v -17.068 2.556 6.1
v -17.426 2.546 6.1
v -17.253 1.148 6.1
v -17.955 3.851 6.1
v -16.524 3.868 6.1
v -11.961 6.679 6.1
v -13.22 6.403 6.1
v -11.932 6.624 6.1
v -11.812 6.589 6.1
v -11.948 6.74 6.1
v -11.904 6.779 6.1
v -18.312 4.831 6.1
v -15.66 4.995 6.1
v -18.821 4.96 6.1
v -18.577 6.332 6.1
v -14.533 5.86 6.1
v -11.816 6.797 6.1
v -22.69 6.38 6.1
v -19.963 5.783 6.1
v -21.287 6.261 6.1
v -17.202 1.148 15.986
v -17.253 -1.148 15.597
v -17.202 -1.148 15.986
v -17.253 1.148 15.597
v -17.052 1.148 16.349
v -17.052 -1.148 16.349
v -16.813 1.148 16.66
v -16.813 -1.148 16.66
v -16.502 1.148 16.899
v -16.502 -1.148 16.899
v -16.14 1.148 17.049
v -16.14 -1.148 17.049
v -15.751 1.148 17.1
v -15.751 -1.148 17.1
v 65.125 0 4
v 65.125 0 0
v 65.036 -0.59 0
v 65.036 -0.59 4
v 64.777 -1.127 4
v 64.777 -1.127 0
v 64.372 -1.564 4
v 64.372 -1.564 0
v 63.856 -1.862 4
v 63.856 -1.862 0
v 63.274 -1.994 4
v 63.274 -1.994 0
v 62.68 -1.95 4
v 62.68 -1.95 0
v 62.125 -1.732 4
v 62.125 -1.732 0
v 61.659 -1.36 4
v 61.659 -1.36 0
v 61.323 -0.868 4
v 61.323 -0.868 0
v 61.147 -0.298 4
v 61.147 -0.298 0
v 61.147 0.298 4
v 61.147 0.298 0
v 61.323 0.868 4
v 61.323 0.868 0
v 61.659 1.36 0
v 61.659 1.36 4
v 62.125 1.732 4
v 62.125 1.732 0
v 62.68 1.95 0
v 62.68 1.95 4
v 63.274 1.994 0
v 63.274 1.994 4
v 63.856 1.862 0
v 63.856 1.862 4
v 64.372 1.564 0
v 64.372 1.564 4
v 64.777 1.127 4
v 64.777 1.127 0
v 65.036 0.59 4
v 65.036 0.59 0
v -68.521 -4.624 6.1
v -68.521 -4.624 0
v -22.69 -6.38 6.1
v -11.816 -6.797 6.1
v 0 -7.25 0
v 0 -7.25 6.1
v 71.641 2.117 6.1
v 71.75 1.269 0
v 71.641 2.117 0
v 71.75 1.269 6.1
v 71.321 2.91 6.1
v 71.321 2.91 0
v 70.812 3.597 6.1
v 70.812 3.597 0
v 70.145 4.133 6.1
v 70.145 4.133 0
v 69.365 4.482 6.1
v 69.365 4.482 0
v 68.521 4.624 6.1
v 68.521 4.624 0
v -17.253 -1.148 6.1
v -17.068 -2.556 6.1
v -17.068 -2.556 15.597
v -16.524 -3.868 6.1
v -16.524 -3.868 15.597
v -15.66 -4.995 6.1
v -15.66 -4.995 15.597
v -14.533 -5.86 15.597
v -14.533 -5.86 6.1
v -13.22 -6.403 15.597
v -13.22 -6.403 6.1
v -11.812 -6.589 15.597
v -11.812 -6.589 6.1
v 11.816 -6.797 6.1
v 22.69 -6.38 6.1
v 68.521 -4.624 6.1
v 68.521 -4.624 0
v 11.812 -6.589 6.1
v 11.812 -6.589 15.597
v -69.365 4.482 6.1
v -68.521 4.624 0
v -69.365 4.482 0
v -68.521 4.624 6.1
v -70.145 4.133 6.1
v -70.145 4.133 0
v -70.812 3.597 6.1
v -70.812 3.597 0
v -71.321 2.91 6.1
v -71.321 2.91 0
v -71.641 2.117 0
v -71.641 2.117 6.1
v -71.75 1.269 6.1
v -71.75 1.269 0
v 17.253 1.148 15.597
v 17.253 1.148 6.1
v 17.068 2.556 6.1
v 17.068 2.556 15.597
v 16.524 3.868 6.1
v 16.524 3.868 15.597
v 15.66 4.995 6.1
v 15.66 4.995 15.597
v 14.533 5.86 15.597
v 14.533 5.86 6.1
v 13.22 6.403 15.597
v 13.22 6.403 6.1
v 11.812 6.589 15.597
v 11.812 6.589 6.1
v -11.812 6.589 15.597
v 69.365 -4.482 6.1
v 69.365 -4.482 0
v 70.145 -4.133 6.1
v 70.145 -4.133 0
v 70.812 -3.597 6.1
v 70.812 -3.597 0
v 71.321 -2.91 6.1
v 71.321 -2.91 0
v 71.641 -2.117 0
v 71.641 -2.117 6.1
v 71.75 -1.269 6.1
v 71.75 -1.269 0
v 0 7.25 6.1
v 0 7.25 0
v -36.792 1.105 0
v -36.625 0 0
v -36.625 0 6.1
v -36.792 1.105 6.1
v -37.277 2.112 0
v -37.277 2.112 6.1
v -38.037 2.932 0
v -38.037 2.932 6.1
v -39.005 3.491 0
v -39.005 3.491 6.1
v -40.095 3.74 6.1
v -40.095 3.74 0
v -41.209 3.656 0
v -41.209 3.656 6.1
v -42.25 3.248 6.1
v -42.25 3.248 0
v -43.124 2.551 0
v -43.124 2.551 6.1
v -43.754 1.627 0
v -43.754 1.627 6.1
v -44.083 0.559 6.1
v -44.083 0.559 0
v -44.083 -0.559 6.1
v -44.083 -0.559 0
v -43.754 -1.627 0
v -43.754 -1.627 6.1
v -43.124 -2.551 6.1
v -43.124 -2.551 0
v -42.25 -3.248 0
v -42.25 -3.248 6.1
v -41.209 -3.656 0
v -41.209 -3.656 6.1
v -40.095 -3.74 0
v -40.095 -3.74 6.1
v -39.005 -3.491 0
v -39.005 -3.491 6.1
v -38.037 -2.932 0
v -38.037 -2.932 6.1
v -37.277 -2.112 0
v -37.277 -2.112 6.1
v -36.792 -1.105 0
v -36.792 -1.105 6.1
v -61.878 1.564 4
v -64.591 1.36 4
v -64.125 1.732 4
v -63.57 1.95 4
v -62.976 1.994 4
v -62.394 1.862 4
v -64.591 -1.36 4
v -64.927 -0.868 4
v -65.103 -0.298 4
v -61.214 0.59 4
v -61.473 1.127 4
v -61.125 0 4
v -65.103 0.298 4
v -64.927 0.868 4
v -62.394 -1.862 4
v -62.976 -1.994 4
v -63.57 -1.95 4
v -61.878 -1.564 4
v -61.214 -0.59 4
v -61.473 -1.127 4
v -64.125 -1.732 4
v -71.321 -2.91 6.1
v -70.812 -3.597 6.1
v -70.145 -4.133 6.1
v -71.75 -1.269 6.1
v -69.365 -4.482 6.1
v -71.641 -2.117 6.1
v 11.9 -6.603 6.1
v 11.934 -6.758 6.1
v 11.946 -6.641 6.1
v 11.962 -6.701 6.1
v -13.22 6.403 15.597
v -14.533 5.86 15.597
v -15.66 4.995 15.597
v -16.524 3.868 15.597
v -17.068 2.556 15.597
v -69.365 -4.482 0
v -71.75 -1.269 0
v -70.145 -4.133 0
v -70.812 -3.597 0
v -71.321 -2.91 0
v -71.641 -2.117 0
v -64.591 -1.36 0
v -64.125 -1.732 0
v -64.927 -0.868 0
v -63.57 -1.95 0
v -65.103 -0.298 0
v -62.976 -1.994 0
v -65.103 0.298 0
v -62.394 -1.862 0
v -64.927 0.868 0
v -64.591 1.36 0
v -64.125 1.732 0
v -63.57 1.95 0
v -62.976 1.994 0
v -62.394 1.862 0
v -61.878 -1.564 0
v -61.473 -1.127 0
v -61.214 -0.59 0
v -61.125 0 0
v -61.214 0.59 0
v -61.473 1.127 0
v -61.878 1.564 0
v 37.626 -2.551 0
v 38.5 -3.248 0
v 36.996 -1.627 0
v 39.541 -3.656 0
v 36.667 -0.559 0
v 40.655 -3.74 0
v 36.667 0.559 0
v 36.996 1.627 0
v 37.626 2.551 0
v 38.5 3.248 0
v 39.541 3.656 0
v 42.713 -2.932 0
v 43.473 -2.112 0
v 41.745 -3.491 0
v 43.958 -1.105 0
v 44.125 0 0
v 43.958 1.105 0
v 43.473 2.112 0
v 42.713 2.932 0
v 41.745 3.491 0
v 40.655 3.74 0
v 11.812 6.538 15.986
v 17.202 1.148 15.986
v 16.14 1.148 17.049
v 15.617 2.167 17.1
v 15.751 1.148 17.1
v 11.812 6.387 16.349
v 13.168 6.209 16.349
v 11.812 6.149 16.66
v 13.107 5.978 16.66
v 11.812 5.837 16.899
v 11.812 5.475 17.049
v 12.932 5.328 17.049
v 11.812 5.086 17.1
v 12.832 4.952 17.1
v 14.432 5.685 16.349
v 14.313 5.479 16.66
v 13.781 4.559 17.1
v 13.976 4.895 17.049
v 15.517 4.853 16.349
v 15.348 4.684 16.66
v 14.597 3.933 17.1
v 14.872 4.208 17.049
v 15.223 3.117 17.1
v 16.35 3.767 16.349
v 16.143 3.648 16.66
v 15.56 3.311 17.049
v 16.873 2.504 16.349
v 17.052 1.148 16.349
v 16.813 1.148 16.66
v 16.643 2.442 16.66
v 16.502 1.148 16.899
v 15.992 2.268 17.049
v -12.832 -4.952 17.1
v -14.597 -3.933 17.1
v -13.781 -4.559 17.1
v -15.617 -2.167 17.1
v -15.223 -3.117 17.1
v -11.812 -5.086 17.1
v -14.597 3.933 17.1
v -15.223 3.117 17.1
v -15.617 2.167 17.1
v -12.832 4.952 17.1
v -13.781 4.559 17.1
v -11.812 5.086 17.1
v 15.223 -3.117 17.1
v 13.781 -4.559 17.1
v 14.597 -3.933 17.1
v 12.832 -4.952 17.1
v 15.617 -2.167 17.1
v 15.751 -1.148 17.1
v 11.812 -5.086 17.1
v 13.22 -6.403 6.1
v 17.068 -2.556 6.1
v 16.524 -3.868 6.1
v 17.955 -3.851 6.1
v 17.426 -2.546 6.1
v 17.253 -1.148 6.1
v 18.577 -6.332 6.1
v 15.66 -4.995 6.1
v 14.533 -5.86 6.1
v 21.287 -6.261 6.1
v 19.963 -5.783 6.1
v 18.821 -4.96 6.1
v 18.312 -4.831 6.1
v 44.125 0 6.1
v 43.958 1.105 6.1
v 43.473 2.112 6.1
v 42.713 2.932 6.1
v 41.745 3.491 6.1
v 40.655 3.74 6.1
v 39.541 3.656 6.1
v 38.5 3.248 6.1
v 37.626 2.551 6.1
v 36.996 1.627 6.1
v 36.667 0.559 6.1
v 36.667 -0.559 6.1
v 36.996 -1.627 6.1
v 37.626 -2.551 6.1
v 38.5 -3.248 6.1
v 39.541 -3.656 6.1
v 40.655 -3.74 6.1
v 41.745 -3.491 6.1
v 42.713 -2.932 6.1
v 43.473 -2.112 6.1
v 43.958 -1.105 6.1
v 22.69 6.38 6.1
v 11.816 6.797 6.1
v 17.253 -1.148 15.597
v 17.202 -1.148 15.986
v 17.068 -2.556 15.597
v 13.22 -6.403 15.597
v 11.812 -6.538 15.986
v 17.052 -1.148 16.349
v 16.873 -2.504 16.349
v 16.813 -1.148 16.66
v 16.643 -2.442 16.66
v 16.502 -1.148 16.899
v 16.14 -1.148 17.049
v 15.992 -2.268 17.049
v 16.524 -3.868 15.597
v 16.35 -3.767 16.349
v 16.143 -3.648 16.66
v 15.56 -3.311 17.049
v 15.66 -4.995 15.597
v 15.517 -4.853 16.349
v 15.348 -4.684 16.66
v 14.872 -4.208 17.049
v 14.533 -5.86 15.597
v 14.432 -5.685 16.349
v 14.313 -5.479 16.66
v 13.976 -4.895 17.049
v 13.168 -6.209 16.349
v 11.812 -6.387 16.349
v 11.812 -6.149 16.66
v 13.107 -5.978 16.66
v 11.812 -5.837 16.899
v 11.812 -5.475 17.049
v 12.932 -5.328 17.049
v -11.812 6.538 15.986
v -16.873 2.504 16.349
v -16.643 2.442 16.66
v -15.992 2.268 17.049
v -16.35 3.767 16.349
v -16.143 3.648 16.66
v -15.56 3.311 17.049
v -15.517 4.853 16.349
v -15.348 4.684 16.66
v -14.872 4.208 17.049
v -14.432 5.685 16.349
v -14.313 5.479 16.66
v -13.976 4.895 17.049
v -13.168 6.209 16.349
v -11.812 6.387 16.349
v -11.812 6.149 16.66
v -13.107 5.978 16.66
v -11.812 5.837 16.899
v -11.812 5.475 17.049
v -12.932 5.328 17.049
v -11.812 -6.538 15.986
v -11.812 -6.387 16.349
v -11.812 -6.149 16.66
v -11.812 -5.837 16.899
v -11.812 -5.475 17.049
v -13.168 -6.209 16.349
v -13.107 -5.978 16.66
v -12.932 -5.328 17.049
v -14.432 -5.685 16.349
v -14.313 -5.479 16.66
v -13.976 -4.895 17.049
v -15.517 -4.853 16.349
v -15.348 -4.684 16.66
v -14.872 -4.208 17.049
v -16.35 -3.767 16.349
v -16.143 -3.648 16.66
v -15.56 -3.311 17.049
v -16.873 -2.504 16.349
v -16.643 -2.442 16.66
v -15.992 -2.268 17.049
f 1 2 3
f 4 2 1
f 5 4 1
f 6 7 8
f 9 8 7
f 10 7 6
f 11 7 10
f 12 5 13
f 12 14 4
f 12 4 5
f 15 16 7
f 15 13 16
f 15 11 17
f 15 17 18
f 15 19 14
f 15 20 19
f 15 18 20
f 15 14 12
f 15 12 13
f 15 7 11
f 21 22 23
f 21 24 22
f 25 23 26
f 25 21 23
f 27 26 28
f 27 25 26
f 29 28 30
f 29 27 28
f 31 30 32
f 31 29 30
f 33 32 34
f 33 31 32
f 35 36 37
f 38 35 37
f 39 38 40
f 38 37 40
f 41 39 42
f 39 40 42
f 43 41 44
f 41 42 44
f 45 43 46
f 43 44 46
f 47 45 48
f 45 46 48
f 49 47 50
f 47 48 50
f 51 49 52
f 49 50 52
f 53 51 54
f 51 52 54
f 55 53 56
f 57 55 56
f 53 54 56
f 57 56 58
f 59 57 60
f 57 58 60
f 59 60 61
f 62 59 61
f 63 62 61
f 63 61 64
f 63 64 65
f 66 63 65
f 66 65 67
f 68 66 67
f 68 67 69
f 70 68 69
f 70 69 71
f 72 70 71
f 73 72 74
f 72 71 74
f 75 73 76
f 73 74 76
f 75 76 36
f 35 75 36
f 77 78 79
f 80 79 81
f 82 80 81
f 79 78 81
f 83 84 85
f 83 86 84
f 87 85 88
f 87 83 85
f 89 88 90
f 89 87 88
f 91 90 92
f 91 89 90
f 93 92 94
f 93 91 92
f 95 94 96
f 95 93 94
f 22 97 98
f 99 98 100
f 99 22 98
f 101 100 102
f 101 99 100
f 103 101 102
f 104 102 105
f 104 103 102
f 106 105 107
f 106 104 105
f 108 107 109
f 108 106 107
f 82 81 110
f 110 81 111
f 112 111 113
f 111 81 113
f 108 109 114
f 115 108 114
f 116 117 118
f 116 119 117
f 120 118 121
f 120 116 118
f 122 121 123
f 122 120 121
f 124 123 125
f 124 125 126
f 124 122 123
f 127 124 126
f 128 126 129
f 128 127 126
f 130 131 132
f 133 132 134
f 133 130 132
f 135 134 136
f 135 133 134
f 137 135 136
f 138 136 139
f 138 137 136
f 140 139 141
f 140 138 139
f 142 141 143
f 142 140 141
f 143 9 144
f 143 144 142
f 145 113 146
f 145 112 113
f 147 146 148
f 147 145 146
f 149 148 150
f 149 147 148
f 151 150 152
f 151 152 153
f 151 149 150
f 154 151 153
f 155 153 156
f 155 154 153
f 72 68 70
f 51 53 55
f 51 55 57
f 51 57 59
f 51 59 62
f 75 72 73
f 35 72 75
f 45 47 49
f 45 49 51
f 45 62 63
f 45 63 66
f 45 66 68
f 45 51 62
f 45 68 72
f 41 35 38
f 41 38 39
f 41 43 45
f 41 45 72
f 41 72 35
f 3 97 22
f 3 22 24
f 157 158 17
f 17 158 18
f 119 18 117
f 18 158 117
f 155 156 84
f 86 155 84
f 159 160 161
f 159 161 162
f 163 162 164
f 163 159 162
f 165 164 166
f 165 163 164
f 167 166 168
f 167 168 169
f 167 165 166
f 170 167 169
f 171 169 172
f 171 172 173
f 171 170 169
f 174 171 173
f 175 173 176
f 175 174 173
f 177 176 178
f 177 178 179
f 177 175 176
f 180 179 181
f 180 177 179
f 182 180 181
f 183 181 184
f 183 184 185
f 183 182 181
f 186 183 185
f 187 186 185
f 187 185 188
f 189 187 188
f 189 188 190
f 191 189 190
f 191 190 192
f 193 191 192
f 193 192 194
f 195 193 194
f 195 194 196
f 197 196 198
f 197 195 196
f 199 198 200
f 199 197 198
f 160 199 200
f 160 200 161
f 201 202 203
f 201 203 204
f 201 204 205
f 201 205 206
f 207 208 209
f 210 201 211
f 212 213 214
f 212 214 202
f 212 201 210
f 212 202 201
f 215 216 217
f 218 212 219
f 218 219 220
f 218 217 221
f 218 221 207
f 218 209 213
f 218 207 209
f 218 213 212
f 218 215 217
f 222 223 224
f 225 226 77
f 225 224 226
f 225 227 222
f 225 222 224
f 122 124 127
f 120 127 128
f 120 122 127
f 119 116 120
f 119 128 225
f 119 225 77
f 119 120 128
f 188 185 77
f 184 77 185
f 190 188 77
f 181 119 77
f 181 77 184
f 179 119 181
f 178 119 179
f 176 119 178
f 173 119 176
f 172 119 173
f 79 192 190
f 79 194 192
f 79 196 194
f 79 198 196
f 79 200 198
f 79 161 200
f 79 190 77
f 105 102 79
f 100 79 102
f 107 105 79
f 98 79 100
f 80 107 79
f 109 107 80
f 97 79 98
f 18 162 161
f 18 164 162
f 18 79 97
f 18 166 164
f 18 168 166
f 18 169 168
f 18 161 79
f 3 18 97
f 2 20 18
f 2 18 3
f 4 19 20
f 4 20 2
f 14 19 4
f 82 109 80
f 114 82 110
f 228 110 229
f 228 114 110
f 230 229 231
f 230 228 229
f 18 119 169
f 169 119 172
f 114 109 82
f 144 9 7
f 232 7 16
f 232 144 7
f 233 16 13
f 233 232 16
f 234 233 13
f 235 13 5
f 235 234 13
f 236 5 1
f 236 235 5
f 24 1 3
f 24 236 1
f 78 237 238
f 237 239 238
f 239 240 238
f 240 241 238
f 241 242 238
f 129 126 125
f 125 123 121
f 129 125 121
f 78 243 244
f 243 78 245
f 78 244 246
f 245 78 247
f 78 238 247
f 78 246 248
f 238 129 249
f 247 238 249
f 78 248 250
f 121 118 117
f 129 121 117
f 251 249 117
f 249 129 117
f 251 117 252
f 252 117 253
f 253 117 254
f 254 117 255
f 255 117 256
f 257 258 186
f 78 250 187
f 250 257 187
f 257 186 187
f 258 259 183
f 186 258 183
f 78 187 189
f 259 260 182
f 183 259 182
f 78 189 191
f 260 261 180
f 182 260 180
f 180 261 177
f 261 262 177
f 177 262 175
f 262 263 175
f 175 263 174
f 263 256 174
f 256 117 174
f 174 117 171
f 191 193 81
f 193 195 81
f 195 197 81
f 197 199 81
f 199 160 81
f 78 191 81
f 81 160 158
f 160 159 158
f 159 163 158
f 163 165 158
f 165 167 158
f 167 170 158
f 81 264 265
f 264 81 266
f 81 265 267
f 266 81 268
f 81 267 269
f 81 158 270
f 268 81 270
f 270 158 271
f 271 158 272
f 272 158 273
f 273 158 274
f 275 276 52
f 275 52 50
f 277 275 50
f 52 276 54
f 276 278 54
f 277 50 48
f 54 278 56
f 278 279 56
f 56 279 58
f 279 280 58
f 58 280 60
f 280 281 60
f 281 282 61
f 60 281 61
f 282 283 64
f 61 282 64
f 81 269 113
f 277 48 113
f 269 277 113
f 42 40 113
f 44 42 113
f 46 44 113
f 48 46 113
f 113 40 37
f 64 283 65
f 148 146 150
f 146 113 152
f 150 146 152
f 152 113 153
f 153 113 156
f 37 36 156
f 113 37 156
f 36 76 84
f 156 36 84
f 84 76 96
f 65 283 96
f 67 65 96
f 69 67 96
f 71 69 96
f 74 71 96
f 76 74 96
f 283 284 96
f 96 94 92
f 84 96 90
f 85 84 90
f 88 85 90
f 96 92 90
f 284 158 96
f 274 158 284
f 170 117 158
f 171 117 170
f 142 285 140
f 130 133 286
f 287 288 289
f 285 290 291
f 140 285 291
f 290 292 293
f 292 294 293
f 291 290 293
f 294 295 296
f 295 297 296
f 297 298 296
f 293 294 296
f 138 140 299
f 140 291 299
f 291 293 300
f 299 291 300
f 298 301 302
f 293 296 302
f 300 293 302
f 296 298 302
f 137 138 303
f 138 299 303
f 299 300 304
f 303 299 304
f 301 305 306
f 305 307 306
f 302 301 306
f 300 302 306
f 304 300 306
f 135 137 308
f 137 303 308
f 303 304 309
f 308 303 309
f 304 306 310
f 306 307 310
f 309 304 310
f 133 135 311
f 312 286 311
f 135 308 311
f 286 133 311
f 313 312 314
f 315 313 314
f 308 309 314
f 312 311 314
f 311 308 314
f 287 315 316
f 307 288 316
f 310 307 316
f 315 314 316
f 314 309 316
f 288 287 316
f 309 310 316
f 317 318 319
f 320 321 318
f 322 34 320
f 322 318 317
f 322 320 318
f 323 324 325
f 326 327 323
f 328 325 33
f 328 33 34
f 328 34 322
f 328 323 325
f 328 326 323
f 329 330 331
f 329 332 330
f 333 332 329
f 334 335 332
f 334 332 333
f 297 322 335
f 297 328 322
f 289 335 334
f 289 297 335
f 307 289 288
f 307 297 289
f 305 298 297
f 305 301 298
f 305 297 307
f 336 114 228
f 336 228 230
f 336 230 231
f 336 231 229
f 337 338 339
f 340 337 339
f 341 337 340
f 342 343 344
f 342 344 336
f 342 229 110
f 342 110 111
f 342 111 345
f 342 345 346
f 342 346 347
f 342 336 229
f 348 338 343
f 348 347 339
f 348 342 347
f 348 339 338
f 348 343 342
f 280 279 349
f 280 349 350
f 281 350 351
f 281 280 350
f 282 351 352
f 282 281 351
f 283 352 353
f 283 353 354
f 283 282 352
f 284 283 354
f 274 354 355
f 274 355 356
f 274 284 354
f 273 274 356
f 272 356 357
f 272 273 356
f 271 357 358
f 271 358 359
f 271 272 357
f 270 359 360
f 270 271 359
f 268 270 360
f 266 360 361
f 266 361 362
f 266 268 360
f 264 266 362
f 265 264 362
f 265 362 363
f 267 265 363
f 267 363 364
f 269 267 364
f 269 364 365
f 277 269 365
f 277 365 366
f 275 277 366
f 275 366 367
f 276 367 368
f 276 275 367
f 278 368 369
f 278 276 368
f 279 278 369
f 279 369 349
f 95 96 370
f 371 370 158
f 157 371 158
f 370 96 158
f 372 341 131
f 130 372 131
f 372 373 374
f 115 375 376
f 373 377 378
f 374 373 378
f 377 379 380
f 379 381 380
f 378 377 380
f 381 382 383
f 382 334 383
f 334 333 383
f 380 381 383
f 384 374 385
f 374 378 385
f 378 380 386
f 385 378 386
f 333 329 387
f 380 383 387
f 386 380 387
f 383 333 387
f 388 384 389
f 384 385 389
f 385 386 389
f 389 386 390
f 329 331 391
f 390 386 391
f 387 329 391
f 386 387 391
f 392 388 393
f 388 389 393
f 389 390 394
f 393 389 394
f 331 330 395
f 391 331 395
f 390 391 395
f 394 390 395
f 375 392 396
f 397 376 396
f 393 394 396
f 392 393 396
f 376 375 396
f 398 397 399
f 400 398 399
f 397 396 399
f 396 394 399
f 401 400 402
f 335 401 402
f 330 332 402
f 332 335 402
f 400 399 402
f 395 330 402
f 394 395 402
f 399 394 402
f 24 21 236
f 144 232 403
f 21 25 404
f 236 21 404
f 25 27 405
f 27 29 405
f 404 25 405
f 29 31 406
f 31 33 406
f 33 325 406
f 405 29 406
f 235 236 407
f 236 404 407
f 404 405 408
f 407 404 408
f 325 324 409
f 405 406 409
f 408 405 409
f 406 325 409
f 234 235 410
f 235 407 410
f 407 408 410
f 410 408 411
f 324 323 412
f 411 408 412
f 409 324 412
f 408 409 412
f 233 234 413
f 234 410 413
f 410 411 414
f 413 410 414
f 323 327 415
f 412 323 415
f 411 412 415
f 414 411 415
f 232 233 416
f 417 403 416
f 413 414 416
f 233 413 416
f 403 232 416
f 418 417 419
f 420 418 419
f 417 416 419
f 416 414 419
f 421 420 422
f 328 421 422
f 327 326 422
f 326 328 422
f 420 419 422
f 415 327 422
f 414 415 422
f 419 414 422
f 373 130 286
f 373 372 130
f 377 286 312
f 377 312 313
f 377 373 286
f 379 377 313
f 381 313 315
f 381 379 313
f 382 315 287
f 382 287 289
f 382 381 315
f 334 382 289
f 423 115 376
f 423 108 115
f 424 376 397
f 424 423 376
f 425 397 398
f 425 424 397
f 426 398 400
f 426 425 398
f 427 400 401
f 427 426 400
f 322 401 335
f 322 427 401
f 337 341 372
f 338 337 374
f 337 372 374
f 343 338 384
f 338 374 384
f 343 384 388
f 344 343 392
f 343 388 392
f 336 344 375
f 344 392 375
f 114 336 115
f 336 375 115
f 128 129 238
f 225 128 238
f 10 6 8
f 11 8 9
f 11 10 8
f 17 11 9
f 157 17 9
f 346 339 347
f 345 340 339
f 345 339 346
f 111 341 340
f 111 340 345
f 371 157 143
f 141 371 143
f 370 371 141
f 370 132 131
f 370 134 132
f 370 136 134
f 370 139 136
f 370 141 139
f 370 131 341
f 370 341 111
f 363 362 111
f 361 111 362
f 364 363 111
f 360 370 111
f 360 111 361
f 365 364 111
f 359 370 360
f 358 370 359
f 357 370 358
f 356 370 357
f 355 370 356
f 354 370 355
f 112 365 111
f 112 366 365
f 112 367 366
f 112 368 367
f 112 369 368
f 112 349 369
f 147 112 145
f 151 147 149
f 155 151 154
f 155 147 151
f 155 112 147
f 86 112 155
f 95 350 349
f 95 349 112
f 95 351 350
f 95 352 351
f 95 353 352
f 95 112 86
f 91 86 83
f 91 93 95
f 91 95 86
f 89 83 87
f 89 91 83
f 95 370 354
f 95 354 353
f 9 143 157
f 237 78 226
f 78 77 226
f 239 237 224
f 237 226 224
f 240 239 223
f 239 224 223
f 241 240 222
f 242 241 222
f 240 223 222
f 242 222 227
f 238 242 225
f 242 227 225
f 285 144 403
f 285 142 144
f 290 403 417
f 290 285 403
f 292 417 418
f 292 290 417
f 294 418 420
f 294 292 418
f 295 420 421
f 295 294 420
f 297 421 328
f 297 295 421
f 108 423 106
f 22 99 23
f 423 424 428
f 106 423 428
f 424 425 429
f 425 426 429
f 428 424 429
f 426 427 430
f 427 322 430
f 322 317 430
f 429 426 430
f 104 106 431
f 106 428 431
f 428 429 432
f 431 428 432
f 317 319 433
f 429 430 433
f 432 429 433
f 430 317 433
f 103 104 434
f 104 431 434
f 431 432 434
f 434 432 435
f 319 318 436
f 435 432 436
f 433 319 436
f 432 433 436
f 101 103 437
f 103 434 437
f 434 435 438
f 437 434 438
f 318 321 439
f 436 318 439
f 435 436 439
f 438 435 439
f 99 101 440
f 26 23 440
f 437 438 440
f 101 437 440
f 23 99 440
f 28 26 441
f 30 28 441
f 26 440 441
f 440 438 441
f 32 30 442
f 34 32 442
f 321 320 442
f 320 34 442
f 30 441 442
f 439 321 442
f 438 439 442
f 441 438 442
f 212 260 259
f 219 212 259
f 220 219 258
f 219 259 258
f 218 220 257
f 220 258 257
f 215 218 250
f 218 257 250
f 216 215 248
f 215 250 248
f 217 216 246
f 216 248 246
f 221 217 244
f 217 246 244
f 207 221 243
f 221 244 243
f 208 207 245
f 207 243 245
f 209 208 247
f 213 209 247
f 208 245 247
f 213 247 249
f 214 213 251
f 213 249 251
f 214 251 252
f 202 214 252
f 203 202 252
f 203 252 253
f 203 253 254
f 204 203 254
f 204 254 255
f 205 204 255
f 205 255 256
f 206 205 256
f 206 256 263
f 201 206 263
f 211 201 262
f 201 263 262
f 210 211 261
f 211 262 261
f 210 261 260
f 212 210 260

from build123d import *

# Parameters (mm, degrees)
F0_R     = 3.75
F1_DEPTH = 6.1
F2_W     = 34.5066441072
F2_H     = 13.1774456962
F3_DEPTH = 11
F4_R     = 5.4411545269
F5_R     = 1.5025340948
F6_R     = 2
F7_DEPTH = 4
F8_R     = 3.3571489319


with BuildPart() as f1:
    # F0 (on Top) → F1 (new body)
    with BuildSketch(Plane.XY):
        Polygon((71.75, 4.5), (0, 7.25), (-71.75, 4.5), (-71.75, -4.5), (0, -7.25), (71.75, -4.5), align=None)
        with Locations((-40.375, 0)):
            Circle(F0_R, mode=Mode.SUBTRACT)
        with Locations((40.375, 0)):
            Circle(F0_R, mode=Mode.SUBTRACT)
    extrude(amount=F1_DEPTH)

    # F2 (on face) → F3 (join)
    with BuildSketch(Plane.XY.offset(6.1)):
        Rectangle(F2_W, F2_H)
    extrude(amount=F3_DEPTH)

    # F4
    f4_edges = [f1.edges().sort_by_distance(p)[0] for p in [
        (-17.253322, -6.588723, 11.6),
        (-17.253322, 6.588723, 11.6),
        (17.253322, -6.588723, 11.6),
        (17.253322, 6.588723, 11.6),
    ]]
    fillet(f4_edges, radius=F4_R)

    # F5
    f5_edges = [f1.edges().sort_by_distance(p)[0] for p in [
        (0, 6.588723, 17.1),
        (15.659645, 4.995046, 17.1),
        (17.253322, 0, 17.1),
        (15.659645, -4.995046, 17.1),
        (0, -6.588723, 17.1),
        (-15.659645, -4.995046, 17.1),
        (-17.253322, 0, 17.1),
        (-15.659645, 4.995046, 17.1),
    ]]
    fillet(f5_edges, radius=F5_R)

    # F6 (on face) → F7 (cut)
    with BuildSketch(Plane(origin=(0, 0, 0), x_dir=(1, 0, 0), z_dir=(0, 0, -1))):
        with Locations((-63.125, 0)):
            Circle(F6_R)
        with Locations((63.125, 0)):
            Circle(F6_R)
    extrude(amount=-F7_DEPTH, mode=Mode.SUBTRACT)

    # F8
    f8_edges = [f1.edges().sort_by_distance(p)[0] for p in [
        (71.75, 4.5, 3.05),
        (71.75, -4.5, 3.05),
        (-71.75, 4.5, 3.05),
        (-71.75, -4.5, 3.05),
    ]]
    fillet(f8_edges, radius=F8_R)


solid = f1.part
